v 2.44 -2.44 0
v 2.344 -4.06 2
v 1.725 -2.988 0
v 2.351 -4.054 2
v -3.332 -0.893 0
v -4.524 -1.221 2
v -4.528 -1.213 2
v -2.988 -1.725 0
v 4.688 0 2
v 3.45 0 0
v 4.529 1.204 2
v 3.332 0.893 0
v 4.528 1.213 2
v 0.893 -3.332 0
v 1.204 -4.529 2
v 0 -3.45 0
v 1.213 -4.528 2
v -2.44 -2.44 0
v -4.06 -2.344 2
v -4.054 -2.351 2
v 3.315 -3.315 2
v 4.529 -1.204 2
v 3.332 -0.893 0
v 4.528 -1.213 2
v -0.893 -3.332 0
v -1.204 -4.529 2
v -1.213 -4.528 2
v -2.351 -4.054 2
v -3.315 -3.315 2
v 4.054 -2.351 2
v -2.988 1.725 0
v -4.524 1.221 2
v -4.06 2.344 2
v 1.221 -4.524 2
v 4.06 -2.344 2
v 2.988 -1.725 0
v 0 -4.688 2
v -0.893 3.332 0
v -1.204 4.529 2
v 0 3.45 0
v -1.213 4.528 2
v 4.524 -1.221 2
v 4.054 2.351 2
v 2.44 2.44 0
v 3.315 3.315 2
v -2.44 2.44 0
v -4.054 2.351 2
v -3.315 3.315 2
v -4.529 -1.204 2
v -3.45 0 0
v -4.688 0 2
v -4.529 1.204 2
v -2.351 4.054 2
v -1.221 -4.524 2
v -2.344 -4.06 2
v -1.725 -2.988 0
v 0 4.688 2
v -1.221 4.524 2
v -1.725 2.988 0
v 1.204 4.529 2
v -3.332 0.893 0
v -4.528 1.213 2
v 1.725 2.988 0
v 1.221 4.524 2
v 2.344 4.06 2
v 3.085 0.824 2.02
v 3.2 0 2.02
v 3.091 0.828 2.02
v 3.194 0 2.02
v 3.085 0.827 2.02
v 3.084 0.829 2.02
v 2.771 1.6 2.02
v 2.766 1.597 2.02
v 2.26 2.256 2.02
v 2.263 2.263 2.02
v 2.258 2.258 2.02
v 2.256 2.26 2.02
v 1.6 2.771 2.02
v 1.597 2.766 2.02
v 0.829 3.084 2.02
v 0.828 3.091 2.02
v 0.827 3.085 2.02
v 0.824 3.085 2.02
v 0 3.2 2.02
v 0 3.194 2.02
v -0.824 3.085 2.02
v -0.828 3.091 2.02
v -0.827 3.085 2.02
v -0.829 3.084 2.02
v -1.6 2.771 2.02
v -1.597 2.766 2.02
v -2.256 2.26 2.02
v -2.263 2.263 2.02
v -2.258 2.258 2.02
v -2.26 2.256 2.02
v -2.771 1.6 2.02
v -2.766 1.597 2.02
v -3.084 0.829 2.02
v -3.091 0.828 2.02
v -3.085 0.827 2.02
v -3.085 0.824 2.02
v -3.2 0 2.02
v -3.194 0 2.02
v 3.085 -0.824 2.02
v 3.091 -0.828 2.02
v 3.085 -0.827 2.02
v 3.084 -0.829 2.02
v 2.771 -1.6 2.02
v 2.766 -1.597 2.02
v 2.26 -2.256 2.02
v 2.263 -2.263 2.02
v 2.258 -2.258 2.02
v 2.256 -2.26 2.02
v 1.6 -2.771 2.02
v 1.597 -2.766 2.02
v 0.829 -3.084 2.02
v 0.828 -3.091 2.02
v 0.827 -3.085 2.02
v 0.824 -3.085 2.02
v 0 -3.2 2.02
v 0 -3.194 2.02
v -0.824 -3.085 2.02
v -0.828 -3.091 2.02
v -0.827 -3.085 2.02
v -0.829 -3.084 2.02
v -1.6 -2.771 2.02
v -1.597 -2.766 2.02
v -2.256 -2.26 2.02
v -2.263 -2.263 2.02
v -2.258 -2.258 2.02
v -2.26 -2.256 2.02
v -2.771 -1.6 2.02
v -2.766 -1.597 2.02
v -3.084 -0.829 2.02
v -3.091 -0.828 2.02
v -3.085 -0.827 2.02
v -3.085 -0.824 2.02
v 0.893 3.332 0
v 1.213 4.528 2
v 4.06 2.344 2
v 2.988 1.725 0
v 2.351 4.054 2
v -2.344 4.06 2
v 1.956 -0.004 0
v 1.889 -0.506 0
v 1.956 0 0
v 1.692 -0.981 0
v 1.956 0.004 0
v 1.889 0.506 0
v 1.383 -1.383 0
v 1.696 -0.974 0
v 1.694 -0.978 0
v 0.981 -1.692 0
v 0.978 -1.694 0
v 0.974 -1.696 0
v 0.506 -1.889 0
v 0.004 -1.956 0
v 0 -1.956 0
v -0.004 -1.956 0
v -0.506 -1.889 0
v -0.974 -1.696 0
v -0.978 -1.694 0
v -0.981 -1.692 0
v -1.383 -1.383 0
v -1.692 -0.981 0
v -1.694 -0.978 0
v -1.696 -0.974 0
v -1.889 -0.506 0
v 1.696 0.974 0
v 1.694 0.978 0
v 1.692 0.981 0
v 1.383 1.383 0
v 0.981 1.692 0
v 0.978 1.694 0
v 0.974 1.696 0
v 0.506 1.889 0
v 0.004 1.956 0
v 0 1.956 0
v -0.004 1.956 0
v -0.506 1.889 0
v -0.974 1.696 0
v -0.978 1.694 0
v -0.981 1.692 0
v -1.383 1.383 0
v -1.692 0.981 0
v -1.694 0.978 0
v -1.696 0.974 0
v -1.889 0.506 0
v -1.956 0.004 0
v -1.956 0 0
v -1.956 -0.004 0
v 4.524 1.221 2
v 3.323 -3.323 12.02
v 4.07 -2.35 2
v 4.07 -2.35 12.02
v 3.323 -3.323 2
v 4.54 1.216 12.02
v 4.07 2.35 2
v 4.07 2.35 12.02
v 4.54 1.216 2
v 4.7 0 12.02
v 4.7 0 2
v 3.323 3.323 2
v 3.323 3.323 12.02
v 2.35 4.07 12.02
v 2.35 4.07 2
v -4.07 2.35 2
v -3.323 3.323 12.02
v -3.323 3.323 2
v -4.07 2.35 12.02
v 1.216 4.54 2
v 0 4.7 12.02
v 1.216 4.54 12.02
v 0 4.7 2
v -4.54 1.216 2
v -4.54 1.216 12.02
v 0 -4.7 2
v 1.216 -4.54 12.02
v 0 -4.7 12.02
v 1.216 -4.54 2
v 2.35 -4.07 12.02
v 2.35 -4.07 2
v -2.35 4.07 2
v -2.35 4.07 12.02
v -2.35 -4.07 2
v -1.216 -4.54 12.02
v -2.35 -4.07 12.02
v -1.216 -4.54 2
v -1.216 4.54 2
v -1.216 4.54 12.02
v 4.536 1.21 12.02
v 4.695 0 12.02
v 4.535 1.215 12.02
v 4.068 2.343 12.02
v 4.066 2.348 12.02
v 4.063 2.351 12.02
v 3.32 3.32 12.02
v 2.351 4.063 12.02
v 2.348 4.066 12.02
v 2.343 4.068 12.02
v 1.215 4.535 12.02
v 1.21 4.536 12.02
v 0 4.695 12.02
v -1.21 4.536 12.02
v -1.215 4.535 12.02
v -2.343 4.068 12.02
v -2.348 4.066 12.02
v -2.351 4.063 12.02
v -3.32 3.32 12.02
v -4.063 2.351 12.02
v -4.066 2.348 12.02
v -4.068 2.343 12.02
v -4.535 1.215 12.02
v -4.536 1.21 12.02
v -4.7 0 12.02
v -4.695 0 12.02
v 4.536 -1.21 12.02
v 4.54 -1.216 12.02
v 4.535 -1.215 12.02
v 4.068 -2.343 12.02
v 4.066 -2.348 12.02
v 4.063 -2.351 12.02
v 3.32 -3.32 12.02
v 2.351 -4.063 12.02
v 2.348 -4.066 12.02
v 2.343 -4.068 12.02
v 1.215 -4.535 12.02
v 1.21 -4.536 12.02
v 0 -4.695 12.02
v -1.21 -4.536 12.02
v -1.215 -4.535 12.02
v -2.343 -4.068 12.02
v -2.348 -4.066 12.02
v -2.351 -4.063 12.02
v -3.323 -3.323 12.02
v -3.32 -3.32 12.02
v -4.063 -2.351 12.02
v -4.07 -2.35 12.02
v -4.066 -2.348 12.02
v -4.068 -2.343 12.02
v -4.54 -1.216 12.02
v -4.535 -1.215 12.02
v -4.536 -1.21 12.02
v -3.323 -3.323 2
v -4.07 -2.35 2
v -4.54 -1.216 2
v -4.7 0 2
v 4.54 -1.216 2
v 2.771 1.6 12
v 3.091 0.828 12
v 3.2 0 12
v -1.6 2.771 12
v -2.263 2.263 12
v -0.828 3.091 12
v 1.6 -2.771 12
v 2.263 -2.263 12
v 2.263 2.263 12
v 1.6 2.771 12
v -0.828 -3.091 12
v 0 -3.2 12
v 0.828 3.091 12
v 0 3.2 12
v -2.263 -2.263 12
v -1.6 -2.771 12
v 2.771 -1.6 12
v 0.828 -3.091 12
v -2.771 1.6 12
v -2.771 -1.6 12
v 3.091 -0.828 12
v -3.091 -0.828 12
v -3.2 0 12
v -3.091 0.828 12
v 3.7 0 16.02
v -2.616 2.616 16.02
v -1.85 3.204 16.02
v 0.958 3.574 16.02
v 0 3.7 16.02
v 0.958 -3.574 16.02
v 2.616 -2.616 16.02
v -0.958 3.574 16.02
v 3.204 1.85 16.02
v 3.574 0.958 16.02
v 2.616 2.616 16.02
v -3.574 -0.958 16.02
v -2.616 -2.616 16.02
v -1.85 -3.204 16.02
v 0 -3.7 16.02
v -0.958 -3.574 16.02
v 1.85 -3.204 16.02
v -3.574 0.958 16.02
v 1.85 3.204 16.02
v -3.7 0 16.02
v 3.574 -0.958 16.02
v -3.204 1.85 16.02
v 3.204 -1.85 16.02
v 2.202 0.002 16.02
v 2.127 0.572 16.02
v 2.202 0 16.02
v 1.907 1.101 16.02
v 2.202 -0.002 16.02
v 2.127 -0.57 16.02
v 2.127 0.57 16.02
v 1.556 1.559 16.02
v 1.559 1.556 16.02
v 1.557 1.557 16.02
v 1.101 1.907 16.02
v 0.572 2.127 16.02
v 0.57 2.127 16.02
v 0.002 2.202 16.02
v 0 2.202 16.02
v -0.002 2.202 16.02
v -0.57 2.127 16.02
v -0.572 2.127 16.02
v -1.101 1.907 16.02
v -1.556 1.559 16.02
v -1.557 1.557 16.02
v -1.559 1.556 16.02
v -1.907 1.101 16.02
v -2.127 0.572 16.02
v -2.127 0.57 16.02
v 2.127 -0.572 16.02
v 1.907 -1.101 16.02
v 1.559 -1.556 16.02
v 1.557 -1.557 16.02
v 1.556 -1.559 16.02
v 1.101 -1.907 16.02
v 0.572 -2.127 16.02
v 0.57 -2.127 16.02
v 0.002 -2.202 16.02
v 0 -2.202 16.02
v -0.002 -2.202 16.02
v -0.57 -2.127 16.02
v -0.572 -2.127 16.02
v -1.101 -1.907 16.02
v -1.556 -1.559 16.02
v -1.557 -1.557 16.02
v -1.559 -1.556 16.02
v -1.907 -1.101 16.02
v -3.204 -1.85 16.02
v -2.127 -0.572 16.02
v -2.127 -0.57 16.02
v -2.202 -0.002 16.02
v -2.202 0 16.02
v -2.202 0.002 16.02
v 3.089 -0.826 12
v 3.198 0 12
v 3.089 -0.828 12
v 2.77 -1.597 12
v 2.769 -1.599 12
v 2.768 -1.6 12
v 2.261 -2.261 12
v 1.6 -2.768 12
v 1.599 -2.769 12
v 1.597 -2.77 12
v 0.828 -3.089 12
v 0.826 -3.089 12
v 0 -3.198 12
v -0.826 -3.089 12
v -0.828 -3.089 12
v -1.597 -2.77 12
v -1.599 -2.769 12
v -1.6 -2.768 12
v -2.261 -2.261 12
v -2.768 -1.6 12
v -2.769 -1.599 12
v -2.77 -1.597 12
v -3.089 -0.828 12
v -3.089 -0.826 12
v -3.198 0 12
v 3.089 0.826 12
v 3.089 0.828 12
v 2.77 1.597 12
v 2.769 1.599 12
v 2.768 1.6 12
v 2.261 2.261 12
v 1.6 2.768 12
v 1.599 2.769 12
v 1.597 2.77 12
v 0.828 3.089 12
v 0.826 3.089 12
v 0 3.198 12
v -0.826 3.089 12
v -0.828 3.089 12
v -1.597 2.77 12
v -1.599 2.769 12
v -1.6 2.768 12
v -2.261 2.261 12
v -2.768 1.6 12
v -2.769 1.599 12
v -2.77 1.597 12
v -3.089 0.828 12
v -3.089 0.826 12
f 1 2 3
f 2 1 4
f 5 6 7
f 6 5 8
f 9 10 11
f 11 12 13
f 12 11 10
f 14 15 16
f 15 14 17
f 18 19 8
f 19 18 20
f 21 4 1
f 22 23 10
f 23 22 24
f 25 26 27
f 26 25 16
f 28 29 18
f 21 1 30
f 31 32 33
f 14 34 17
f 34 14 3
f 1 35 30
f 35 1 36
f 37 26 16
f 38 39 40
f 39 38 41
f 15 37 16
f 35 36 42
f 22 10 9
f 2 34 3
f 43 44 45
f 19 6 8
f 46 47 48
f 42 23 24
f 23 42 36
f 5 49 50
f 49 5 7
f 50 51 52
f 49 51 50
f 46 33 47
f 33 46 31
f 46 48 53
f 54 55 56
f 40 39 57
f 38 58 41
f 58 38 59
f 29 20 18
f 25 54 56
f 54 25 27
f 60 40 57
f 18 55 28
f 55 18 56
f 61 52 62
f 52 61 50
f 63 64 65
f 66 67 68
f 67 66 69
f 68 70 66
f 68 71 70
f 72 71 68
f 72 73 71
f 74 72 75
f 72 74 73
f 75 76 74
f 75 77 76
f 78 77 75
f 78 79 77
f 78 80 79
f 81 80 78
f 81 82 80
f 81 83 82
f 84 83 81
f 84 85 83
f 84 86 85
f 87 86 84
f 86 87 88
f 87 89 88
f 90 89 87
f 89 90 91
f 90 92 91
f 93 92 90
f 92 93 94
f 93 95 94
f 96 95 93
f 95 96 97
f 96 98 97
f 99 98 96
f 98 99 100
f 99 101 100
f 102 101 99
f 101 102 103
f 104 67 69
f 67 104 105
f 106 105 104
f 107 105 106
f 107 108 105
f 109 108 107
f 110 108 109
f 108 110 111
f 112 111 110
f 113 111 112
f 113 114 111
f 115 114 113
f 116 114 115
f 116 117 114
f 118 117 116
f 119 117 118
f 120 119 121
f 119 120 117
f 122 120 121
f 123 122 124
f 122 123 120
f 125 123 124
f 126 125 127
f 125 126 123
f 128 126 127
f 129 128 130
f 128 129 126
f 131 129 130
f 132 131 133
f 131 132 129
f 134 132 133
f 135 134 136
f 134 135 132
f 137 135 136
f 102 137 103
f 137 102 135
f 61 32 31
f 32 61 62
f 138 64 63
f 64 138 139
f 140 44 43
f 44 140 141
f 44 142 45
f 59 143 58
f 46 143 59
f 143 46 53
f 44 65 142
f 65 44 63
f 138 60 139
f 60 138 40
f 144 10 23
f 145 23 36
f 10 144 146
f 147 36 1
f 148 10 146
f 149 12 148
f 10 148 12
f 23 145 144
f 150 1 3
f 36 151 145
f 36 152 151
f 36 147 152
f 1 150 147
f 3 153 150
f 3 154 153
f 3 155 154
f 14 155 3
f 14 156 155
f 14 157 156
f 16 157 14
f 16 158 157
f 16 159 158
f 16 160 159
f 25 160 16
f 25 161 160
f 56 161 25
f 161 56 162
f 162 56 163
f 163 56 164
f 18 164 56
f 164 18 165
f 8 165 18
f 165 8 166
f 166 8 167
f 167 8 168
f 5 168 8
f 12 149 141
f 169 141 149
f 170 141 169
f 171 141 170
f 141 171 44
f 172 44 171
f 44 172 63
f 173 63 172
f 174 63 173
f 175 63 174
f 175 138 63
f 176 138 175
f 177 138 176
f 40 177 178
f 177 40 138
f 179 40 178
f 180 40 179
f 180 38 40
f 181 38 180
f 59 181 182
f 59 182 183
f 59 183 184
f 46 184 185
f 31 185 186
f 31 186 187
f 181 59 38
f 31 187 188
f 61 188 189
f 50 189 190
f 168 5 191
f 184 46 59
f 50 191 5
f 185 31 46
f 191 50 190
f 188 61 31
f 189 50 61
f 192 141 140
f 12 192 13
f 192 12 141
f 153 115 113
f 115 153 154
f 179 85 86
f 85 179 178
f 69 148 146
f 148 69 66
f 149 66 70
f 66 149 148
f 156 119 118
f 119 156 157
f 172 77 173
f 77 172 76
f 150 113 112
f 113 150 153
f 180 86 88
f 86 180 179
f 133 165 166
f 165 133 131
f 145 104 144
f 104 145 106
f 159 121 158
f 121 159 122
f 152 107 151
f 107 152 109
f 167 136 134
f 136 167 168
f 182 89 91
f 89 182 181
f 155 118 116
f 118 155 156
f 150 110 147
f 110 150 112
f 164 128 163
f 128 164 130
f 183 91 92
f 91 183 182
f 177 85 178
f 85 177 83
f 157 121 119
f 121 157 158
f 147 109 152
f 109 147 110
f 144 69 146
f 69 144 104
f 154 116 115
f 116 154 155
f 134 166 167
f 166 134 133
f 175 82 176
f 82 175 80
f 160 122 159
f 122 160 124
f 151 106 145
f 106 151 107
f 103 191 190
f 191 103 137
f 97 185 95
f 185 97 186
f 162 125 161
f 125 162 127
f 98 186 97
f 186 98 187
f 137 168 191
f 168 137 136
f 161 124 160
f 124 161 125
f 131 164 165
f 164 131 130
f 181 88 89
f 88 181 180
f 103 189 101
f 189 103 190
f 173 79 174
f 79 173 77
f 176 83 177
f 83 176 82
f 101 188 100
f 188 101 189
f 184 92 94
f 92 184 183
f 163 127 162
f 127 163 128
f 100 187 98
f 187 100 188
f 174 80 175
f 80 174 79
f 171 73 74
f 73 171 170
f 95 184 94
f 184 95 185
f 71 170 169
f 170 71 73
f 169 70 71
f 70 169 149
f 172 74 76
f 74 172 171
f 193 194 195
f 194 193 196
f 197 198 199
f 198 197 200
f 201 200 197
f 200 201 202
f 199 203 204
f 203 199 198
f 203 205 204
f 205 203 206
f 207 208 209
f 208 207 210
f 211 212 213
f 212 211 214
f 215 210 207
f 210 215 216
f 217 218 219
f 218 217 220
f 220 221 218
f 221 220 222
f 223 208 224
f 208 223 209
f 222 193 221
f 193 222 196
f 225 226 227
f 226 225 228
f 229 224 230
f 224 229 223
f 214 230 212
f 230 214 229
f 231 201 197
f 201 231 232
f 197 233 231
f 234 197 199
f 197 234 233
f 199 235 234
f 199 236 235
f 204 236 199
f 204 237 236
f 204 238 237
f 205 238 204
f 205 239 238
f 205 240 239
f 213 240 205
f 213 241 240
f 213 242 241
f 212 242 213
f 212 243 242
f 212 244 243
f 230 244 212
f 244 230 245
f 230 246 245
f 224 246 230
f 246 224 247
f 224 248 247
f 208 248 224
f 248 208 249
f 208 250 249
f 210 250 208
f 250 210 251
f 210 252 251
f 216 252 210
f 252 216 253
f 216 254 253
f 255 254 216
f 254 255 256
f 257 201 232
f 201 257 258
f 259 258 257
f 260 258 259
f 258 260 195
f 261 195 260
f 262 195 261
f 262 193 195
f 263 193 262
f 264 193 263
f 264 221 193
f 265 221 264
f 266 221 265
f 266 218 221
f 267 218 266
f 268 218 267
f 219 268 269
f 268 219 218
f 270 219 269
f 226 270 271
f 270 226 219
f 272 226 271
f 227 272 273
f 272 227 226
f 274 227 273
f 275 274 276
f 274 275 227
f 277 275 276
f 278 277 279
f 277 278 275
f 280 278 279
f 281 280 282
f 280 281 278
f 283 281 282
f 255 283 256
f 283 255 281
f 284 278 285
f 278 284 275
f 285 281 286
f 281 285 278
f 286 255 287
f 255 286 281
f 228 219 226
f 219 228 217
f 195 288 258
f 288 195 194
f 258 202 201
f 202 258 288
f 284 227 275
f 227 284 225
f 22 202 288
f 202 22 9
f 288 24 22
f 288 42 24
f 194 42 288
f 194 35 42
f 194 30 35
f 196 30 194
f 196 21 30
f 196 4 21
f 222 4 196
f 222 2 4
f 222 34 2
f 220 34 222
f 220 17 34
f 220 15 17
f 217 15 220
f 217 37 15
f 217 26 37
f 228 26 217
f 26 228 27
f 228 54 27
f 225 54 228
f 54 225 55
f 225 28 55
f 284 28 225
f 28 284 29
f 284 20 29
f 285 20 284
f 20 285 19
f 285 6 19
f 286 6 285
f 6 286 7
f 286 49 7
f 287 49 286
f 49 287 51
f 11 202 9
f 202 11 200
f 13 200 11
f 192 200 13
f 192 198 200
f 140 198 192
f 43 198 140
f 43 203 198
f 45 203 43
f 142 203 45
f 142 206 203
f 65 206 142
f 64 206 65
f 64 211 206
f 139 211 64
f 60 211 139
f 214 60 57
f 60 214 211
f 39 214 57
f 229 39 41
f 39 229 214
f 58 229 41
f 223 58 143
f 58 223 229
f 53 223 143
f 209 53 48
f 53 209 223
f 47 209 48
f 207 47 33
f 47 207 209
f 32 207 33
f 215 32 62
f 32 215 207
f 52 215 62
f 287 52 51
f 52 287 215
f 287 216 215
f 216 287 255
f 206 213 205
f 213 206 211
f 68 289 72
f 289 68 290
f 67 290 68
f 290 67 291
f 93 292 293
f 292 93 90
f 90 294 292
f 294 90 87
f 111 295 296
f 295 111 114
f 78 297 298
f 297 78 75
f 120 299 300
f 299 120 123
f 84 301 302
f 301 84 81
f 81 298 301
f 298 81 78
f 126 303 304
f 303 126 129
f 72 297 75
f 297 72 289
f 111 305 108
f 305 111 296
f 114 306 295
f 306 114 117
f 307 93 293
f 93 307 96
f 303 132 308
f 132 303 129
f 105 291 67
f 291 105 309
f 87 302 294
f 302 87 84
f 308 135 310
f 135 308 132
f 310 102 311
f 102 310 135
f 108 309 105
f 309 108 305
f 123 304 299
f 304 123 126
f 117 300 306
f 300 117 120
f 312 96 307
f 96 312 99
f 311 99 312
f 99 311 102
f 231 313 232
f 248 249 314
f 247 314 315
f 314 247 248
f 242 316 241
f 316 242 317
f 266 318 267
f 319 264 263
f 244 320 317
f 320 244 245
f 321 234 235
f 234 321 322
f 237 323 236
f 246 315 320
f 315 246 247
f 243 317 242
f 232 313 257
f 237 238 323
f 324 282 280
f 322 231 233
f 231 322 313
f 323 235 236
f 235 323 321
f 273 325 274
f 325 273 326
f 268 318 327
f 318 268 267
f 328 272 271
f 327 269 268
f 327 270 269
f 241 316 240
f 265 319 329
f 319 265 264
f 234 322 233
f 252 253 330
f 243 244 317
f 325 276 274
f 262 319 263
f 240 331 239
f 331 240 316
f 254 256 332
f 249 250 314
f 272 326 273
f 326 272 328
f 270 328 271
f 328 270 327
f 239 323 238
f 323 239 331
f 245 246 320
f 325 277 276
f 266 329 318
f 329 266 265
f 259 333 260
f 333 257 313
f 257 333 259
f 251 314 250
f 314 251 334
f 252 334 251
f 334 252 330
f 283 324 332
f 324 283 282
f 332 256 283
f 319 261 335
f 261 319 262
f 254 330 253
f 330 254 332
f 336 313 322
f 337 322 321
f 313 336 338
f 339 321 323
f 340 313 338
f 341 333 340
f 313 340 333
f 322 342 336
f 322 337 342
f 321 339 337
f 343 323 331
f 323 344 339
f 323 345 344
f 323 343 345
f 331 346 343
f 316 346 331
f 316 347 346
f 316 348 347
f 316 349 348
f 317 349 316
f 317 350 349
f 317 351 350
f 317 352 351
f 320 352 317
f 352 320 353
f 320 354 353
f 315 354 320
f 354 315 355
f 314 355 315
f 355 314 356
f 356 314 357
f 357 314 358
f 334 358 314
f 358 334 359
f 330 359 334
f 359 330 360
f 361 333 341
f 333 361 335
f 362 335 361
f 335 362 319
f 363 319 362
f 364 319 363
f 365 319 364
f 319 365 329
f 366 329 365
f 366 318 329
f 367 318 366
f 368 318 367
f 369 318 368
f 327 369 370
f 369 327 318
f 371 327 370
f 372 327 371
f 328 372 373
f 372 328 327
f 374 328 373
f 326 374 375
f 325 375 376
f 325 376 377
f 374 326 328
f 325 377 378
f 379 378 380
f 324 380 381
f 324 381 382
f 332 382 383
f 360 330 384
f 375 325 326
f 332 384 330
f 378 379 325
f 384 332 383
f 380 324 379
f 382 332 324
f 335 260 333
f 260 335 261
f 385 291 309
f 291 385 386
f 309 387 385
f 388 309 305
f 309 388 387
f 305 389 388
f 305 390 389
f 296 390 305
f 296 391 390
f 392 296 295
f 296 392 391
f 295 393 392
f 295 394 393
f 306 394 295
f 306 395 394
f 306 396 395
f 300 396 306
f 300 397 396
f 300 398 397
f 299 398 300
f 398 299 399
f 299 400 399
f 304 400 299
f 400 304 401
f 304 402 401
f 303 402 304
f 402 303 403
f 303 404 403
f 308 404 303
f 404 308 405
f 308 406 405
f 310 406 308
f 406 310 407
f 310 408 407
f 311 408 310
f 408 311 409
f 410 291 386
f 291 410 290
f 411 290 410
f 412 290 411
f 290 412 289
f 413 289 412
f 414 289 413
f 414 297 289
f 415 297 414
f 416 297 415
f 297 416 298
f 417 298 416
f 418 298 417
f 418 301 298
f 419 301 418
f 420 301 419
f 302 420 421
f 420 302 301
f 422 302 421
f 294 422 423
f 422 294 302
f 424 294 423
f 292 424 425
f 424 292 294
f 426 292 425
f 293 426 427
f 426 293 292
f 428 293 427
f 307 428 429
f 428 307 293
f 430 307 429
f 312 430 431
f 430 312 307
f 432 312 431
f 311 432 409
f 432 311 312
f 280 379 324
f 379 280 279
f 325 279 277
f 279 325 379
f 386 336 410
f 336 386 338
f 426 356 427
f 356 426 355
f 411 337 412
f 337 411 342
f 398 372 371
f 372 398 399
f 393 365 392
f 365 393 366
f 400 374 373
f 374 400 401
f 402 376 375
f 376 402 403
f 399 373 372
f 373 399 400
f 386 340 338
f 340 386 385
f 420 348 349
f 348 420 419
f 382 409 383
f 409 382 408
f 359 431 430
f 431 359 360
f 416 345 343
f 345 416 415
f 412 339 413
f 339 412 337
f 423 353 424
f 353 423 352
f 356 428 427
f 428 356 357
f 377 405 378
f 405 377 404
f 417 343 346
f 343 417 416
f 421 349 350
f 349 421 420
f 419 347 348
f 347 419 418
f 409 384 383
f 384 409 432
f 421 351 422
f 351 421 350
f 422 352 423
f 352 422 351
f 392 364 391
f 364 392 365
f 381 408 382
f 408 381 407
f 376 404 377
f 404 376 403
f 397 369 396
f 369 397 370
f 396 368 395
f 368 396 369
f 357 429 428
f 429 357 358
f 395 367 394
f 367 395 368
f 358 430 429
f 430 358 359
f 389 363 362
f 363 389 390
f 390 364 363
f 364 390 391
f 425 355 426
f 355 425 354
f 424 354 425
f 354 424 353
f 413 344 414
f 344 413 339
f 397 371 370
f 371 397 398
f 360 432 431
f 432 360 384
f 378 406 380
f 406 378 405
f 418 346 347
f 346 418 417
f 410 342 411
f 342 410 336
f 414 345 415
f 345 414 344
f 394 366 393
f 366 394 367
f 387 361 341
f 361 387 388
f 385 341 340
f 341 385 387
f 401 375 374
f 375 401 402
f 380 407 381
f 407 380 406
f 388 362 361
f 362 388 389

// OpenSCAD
tolerance  = 0.2;
wall = 1.5;
bottomHole = 3.5;
middleHole = 6;
topHole = 4;

bottomLength = 2;
middleLength = 10;
topLength = 4;

module dummy(){}

$fn = 24;
nudge = 0.01;

module cyl(id,height,id2=undef) {
    id2 = id2 == undef ? id : id2;
    
    difference() {
        cylinder(d1=id+2*wall+2*tolerance,d2=id2+2*wall+2*tolerance,height+2*nudge);
        translate([0,0,-nudge])
        cylinder(d1=id+2*tolerance,d2=id2+2*tolerance,height+4*nudge);
    }
}

cyl(bottomHole,bottomLength,middleHole);
translate([0,0,bottomLength]) cyl(middleHole,middleLength);
translate([0,0,bottomLength+middleLength]) cyl(middleHole,topLength,topHole);
